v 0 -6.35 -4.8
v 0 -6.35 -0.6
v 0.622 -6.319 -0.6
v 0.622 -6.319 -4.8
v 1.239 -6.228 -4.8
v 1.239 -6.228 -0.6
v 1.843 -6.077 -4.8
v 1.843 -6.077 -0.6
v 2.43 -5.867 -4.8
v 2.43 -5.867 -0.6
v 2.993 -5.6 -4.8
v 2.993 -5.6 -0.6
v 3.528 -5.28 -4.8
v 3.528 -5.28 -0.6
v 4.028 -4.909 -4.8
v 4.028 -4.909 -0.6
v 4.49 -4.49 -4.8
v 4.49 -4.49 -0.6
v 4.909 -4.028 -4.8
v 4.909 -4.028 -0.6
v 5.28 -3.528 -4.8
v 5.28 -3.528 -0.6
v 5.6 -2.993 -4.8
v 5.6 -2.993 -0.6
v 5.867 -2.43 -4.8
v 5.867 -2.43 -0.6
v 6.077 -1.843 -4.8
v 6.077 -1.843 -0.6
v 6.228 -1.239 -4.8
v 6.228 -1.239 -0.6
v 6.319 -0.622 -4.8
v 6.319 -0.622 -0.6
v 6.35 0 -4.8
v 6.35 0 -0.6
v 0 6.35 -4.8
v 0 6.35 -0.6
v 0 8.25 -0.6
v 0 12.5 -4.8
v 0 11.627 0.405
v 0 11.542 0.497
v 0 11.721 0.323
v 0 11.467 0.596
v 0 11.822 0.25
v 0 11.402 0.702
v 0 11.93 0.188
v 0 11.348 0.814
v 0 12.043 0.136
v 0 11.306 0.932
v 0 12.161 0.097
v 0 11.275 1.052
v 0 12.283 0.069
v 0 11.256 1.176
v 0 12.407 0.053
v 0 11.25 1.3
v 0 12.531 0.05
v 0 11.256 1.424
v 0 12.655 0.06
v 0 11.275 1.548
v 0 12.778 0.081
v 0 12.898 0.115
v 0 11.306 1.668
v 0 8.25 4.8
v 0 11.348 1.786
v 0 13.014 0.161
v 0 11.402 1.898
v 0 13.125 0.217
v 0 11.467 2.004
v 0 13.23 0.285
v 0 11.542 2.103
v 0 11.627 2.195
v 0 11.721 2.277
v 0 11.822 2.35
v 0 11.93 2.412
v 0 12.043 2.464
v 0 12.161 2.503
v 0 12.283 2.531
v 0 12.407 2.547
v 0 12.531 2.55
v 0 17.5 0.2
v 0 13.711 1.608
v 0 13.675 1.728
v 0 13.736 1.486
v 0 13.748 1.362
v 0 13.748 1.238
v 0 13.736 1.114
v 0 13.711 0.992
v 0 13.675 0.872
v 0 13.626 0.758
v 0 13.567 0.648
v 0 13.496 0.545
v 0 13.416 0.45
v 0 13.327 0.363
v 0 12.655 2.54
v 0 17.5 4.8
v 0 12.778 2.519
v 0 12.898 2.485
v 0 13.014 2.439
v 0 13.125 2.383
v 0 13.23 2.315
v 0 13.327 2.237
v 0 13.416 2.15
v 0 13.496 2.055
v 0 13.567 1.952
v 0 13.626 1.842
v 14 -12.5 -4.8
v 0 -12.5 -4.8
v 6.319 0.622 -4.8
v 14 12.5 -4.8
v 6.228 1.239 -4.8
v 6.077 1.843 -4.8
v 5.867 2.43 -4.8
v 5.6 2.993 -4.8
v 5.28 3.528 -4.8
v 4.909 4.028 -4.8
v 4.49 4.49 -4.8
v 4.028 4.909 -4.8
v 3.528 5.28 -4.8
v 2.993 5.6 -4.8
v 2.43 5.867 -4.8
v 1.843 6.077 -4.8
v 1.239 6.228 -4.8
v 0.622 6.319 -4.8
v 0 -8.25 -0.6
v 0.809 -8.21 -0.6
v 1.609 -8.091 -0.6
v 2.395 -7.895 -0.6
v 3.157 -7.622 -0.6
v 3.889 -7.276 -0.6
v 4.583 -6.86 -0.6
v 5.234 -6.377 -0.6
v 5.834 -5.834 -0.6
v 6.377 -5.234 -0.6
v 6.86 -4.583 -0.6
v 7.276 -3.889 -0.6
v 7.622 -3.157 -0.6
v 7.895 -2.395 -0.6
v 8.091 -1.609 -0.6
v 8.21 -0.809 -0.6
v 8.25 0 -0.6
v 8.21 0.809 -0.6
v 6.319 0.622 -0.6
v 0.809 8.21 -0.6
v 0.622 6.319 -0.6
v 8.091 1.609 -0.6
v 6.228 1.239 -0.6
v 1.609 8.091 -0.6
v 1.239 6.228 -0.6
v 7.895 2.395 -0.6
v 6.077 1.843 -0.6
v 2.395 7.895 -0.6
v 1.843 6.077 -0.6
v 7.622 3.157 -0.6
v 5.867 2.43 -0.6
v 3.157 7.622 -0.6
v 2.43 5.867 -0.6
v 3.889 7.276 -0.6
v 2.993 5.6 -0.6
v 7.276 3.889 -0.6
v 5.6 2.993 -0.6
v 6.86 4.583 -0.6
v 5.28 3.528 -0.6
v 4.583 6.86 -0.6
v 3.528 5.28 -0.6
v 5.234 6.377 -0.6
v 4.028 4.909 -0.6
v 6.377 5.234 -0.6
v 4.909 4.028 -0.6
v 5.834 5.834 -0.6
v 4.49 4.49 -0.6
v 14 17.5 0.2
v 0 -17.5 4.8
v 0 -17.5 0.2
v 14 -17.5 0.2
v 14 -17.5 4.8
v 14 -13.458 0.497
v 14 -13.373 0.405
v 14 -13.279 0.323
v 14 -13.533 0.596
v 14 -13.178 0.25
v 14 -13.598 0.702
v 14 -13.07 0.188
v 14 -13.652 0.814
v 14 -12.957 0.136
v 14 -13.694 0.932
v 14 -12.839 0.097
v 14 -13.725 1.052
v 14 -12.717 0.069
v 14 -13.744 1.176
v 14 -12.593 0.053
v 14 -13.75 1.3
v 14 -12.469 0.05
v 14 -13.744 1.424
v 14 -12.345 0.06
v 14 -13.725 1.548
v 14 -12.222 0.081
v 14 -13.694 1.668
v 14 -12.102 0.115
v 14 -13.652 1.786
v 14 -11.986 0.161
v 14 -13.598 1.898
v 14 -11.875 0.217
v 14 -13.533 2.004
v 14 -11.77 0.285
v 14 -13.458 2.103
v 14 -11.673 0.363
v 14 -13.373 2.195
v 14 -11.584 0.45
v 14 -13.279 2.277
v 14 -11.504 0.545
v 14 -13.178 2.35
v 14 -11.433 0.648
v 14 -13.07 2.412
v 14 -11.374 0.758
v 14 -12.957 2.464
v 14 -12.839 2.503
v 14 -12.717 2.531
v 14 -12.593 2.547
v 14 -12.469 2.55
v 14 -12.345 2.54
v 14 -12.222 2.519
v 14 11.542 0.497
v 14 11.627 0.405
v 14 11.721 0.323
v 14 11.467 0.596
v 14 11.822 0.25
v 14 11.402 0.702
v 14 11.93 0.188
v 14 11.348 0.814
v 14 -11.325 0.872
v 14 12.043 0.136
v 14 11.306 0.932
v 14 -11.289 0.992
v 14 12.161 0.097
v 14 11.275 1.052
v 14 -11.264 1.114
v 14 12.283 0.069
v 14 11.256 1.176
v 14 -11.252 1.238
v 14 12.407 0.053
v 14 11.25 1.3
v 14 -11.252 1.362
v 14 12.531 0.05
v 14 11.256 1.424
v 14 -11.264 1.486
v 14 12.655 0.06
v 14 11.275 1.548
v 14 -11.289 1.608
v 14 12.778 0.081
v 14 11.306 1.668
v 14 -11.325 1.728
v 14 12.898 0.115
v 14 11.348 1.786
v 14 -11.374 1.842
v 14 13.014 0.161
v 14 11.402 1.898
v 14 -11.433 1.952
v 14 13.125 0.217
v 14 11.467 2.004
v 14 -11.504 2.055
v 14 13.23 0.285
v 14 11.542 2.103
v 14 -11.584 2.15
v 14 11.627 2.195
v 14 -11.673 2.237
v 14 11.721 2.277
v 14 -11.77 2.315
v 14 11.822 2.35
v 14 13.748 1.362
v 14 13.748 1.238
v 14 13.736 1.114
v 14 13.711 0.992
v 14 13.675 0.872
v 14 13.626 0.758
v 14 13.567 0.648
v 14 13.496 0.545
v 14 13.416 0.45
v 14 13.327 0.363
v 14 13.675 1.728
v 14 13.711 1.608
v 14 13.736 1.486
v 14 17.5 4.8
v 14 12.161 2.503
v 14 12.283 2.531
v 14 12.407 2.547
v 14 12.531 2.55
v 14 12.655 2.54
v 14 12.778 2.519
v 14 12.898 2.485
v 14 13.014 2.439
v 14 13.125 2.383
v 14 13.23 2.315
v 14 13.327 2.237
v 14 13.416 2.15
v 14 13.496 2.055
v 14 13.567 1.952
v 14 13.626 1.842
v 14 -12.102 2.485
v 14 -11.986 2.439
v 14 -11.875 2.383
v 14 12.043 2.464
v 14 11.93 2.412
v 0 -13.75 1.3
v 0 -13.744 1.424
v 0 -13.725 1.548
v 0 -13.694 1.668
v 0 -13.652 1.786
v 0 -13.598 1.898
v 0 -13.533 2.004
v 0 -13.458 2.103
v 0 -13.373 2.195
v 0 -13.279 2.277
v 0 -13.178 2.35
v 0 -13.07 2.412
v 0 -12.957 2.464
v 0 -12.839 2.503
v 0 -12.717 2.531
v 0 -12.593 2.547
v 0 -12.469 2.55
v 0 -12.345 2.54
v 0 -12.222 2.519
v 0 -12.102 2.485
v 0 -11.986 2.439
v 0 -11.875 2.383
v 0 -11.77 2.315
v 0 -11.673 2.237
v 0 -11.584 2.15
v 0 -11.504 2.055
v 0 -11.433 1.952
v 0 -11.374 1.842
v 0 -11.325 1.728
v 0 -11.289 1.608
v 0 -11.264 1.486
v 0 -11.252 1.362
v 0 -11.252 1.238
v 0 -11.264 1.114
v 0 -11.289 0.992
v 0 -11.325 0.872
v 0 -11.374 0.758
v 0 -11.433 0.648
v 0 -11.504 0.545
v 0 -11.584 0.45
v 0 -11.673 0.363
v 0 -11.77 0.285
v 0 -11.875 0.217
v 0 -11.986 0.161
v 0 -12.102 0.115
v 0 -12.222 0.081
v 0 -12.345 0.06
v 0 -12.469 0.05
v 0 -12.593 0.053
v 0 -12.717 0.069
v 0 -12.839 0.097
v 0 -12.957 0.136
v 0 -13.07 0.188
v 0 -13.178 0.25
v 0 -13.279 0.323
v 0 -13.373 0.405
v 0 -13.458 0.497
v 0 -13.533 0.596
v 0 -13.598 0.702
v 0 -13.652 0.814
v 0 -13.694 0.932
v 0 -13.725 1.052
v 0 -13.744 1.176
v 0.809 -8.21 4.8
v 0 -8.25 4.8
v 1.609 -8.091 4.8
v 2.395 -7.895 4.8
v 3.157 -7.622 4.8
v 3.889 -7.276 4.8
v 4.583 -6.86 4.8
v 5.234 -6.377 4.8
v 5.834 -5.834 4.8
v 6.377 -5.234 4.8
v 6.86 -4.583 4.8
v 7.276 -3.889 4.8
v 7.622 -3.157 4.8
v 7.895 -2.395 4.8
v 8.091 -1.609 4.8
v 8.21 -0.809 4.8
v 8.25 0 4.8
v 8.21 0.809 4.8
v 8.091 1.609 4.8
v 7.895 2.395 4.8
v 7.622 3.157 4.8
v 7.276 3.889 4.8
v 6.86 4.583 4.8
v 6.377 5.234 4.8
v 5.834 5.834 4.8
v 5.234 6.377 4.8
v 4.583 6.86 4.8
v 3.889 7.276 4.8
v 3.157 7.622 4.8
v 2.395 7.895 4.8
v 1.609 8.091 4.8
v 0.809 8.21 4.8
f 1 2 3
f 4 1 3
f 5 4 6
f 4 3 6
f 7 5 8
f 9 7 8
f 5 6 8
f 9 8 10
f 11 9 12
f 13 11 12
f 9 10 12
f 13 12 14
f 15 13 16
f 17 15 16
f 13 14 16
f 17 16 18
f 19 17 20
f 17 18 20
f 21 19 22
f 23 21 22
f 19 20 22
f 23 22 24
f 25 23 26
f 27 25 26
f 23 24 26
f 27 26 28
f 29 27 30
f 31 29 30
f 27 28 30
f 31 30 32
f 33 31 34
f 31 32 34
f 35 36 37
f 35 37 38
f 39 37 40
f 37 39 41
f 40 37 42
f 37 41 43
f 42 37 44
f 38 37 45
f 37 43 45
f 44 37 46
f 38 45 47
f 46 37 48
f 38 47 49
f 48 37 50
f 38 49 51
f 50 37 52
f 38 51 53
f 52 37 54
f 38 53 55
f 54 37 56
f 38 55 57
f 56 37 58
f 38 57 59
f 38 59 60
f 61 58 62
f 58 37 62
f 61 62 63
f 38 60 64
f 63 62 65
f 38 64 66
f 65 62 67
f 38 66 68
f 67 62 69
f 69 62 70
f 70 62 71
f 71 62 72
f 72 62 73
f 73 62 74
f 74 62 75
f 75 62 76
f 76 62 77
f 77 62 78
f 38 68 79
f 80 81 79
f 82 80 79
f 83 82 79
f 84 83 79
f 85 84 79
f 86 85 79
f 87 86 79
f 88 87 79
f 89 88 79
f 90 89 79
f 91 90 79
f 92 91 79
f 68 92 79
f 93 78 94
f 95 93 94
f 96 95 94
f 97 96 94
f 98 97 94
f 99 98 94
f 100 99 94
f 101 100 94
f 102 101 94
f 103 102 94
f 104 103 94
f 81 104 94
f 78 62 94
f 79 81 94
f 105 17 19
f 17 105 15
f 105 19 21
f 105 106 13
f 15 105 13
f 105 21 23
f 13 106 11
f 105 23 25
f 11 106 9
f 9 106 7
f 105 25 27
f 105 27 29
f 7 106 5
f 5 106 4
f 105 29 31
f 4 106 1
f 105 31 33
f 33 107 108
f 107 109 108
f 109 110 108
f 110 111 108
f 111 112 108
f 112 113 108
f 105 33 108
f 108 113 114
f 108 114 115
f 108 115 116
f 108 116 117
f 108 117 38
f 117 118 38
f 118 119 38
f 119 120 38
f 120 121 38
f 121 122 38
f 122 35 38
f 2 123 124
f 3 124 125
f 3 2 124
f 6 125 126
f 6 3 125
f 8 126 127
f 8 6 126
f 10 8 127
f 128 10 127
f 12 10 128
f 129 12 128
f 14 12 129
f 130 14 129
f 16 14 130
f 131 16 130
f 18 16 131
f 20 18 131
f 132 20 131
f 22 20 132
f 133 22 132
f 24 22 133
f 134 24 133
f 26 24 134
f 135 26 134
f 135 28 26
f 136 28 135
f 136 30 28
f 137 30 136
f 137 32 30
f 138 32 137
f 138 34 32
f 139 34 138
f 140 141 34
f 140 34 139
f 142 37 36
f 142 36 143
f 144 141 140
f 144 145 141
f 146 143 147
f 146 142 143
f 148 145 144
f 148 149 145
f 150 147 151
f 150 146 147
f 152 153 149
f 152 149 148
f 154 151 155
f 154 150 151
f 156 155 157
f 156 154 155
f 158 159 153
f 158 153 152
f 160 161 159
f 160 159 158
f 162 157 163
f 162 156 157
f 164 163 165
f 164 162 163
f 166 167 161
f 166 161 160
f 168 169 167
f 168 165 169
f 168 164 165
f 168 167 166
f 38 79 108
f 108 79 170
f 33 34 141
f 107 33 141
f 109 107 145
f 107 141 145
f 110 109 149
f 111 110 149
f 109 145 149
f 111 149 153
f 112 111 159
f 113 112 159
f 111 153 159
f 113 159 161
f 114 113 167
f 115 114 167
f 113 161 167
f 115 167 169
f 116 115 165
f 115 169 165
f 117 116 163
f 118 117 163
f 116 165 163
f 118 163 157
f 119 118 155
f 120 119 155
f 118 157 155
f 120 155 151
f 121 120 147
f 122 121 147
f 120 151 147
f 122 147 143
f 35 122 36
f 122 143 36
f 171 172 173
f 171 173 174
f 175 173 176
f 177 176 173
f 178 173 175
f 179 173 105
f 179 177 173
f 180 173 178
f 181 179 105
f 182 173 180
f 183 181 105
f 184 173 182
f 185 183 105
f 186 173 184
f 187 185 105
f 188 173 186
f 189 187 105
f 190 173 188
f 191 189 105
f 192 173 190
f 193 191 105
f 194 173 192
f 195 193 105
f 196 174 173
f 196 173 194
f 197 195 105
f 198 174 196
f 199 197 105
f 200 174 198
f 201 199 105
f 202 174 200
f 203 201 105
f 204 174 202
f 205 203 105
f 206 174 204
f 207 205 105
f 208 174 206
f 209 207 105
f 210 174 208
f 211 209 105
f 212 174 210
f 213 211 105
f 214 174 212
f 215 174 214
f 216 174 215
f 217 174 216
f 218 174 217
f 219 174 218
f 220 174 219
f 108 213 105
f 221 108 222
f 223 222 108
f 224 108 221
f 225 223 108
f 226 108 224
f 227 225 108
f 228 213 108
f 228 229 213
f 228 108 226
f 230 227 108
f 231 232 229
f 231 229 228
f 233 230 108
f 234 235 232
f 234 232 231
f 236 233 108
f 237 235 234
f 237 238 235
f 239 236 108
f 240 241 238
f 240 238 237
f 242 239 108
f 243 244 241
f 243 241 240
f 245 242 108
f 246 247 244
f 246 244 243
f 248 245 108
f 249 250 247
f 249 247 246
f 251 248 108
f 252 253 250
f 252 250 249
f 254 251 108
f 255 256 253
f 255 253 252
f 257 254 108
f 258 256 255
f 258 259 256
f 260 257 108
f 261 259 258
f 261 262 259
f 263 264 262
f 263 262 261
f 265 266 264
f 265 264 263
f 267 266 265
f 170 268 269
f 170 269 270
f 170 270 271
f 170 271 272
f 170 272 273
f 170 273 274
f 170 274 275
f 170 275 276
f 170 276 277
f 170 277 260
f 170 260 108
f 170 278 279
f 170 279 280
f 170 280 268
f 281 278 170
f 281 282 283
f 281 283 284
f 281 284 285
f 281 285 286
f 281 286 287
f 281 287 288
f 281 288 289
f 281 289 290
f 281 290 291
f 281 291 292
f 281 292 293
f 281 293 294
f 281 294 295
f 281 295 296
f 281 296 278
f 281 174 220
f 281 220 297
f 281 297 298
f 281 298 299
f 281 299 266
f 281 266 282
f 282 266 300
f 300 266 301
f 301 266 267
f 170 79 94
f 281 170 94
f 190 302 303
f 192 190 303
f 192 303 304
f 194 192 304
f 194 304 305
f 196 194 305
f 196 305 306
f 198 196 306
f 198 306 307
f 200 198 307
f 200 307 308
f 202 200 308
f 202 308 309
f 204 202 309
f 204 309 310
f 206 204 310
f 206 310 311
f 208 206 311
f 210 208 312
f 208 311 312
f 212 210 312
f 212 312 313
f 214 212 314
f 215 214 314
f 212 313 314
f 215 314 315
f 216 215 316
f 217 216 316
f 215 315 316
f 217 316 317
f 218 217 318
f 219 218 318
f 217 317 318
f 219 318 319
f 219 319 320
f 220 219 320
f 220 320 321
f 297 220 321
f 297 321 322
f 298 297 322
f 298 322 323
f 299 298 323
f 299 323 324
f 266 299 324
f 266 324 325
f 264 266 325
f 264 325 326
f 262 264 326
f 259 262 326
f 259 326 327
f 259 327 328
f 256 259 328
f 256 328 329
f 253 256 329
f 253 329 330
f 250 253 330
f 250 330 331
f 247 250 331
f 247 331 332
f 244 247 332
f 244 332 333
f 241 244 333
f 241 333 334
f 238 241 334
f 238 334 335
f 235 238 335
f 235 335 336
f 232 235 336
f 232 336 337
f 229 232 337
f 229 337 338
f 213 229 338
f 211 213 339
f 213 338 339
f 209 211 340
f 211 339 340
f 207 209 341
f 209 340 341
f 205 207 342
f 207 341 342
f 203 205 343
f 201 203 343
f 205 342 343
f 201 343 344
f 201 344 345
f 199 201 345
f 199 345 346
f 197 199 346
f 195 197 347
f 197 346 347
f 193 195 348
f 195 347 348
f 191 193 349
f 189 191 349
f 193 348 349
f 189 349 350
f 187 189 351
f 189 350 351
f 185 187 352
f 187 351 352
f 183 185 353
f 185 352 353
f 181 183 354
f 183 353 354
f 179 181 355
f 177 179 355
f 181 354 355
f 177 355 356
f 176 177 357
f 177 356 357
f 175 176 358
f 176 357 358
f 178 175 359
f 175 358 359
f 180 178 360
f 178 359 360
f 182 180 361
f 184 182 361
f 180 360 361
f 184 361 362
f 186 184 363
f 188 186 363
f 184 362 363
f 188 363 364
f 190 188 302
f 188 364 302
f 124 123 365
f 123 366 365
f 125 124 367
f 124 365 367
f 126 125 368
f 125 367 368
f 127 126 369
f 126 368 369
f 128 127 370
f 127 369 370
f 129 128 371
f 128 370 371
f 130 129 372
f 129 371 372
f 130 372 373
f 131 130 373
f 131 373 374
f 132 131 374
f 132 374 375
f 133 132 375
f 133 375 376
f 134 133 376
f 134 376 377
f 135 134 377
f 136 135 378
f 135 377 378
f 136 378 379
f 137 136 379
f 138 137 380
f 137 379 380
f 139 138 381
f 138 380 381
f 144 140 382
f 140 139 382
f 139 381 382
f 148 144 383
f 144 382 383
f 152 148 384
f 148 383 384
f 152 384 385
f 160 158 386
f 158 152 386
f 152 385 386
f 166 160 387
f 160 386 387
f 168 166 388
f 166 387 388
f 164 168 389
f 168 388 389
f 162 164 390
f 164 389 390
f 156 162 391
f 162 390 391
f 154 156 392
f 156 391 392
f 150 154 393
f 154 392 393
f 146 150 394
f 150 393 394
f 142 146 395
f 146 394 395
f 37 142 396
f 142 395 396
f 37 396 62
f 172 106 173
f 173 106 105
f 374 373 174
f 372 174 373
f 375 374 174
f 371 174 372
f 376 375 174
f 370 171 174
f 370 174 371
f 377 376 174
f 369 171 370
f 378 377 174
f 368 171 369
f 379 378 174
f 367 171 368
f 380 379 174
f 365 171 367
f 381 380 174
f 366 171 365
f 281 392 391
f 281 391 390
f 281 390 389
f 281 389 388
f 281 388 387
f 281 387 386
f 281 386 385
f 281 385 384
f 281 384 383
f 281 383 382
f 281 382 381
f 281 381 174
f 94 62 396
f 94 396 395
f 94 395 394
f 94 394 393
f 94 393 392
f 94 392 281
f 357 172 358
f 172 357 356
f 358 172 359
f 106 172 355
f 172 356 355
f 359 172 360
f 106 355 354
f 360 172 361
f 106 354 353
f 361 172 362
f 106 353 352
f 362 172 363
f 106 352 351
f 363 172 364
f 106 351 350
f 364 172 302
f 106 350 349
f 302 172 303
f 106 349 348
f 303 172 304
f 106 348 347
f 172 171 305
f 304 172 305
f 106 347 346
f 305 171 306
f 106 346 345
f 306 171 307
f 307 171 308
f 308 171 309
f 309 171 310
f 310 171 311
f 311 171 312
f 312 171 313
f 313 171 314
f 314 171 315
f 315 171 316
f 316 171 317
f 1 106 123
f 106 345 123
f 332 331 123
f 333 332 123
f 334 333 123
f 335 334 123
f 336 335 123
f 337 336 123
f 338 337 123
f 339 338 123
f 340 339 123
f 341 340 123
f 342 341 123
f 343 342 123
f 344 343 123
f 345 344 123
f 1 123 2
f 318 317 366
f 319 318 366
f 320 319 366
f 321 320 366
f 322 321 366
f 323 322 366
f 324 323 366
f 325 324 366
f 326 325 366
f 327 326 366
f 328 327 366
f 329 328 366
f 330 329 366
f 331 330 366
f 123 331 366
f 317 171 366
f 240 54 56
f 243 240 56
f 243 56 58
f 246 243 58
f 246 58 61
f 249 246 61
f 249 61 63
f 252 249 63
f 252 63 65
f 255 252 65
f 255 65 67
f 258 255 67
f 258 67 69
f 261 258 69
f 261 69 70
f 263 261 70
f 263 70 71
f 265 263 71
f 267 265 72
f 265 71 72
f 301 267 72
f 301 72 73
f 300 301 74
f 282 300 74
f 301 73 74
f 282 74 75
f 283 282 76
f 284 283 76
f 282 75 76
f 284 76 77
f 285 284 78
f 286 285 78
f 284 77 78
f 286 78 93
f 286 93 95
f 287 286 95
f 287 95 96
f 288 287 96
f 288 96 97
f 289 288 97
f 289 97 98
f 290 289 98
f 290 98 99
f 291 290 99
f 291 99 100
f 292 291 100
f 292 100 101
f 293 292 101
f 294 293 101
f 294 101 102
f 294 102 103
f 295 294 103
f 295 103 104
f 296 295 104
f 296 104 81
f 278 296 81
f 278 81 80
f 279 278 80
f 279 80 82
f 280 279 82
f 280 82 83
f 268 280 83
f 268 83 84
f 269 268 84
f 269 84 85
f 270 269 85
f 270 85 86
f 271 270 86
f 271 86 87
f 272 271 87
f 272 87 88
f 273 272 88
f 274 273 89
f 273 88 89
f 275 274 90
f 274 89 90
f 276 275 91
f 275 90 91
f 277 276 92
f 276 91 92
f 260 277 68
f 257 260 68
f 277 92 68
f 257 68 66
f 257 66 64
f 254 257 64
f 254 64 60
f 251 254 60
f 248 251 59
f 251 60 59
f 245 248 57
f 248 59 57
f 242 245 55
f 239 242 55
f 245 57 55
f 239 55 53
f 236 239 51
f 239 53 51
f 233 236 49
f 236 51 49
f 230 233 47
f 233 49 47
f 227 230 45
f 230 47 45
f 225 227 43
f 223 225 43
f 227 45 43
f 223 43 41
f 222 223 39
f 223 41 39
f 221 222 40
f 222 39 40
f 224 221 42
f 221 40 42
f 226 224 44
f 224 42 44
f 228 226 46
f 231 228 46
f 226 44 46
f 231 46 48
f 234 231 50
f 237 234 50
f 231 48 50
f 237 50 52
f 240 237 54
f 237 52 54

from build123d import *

# Parameters (mm, degrees)
F0_W     = 35
F0_H     = 9.6
F1_DEPTH = 14
F2_R     = 8.25
F2_R_2   = 6.35
F3_DEPTH = 5.4
F4_DEPTH = 25
F5_SIZE  = 5
F7_D     = 2.5


with BuildPart() as f1:
    # F0 (on Right) → F1 (new body)
    with BuildSketch(Plane.YZ):
        Rectangle(F0_W, F0_H)
    extrude(amount=F1_DEPTH)

    # F2 (on face) → F3 (cut)
    with BuildSketch(Plane.XY.offset(4.8)):
        Circle(F2_R)
        Circle(F2_R_2, mode=Mode.SUBTRACT)
        with BuildLine():
            Line((0, -6.35), (0, 6.35))
            ThreePointArc((0, 6.35), (-6.35, 0), (0, -6.35))
        make_face()
        with BuildLine():
            ThreePointArc((0, -6.35), (4.4901280605, -4.4901280605), (6.35, 0))
            ThreePointArc((6.35, 0), (4.4901280605, 4.4901280605), (0, 6.35))
            Line((0, 6.35), (0, -6.35))
        make_face()
    extrude(amount=-F3_DEPTH, mode=Mode.SUBTRACT)

    # F2 (on face) → F4 (cut)
    with BuildSketch(Plane.XY.offset(4.8)):
        with BuildLine():
            ThreePointArc((0, -6.35), (4.4901280605, -4.4901280605), (6.35, 0))
            ThreePointArc((6.35, 0), (4.4901280605, 4.4901280605), (0, 6.35))
            Line((0, 6.35), (0, -6.35))
        make_face()
    extrude(amount=-F4_DEPTH, mode=Mode.SUBTRACT)

    # F5
    f5_edges = [f1.edges().sort_by_distance(p)[0] for p in [
        (7, 17.5, -4.8),
        (7, -17.5, -4.8),
    ]]
    chamfer(f5_edges, length=F5_SIZE)

    # F7 (through all)
    with Locations(Plane.YZ.offset(14)):
        with Locations((-12.5, 1.3), (12.5, 1.3)):
            Hole(F7_D / 2)


solid = f1.part
